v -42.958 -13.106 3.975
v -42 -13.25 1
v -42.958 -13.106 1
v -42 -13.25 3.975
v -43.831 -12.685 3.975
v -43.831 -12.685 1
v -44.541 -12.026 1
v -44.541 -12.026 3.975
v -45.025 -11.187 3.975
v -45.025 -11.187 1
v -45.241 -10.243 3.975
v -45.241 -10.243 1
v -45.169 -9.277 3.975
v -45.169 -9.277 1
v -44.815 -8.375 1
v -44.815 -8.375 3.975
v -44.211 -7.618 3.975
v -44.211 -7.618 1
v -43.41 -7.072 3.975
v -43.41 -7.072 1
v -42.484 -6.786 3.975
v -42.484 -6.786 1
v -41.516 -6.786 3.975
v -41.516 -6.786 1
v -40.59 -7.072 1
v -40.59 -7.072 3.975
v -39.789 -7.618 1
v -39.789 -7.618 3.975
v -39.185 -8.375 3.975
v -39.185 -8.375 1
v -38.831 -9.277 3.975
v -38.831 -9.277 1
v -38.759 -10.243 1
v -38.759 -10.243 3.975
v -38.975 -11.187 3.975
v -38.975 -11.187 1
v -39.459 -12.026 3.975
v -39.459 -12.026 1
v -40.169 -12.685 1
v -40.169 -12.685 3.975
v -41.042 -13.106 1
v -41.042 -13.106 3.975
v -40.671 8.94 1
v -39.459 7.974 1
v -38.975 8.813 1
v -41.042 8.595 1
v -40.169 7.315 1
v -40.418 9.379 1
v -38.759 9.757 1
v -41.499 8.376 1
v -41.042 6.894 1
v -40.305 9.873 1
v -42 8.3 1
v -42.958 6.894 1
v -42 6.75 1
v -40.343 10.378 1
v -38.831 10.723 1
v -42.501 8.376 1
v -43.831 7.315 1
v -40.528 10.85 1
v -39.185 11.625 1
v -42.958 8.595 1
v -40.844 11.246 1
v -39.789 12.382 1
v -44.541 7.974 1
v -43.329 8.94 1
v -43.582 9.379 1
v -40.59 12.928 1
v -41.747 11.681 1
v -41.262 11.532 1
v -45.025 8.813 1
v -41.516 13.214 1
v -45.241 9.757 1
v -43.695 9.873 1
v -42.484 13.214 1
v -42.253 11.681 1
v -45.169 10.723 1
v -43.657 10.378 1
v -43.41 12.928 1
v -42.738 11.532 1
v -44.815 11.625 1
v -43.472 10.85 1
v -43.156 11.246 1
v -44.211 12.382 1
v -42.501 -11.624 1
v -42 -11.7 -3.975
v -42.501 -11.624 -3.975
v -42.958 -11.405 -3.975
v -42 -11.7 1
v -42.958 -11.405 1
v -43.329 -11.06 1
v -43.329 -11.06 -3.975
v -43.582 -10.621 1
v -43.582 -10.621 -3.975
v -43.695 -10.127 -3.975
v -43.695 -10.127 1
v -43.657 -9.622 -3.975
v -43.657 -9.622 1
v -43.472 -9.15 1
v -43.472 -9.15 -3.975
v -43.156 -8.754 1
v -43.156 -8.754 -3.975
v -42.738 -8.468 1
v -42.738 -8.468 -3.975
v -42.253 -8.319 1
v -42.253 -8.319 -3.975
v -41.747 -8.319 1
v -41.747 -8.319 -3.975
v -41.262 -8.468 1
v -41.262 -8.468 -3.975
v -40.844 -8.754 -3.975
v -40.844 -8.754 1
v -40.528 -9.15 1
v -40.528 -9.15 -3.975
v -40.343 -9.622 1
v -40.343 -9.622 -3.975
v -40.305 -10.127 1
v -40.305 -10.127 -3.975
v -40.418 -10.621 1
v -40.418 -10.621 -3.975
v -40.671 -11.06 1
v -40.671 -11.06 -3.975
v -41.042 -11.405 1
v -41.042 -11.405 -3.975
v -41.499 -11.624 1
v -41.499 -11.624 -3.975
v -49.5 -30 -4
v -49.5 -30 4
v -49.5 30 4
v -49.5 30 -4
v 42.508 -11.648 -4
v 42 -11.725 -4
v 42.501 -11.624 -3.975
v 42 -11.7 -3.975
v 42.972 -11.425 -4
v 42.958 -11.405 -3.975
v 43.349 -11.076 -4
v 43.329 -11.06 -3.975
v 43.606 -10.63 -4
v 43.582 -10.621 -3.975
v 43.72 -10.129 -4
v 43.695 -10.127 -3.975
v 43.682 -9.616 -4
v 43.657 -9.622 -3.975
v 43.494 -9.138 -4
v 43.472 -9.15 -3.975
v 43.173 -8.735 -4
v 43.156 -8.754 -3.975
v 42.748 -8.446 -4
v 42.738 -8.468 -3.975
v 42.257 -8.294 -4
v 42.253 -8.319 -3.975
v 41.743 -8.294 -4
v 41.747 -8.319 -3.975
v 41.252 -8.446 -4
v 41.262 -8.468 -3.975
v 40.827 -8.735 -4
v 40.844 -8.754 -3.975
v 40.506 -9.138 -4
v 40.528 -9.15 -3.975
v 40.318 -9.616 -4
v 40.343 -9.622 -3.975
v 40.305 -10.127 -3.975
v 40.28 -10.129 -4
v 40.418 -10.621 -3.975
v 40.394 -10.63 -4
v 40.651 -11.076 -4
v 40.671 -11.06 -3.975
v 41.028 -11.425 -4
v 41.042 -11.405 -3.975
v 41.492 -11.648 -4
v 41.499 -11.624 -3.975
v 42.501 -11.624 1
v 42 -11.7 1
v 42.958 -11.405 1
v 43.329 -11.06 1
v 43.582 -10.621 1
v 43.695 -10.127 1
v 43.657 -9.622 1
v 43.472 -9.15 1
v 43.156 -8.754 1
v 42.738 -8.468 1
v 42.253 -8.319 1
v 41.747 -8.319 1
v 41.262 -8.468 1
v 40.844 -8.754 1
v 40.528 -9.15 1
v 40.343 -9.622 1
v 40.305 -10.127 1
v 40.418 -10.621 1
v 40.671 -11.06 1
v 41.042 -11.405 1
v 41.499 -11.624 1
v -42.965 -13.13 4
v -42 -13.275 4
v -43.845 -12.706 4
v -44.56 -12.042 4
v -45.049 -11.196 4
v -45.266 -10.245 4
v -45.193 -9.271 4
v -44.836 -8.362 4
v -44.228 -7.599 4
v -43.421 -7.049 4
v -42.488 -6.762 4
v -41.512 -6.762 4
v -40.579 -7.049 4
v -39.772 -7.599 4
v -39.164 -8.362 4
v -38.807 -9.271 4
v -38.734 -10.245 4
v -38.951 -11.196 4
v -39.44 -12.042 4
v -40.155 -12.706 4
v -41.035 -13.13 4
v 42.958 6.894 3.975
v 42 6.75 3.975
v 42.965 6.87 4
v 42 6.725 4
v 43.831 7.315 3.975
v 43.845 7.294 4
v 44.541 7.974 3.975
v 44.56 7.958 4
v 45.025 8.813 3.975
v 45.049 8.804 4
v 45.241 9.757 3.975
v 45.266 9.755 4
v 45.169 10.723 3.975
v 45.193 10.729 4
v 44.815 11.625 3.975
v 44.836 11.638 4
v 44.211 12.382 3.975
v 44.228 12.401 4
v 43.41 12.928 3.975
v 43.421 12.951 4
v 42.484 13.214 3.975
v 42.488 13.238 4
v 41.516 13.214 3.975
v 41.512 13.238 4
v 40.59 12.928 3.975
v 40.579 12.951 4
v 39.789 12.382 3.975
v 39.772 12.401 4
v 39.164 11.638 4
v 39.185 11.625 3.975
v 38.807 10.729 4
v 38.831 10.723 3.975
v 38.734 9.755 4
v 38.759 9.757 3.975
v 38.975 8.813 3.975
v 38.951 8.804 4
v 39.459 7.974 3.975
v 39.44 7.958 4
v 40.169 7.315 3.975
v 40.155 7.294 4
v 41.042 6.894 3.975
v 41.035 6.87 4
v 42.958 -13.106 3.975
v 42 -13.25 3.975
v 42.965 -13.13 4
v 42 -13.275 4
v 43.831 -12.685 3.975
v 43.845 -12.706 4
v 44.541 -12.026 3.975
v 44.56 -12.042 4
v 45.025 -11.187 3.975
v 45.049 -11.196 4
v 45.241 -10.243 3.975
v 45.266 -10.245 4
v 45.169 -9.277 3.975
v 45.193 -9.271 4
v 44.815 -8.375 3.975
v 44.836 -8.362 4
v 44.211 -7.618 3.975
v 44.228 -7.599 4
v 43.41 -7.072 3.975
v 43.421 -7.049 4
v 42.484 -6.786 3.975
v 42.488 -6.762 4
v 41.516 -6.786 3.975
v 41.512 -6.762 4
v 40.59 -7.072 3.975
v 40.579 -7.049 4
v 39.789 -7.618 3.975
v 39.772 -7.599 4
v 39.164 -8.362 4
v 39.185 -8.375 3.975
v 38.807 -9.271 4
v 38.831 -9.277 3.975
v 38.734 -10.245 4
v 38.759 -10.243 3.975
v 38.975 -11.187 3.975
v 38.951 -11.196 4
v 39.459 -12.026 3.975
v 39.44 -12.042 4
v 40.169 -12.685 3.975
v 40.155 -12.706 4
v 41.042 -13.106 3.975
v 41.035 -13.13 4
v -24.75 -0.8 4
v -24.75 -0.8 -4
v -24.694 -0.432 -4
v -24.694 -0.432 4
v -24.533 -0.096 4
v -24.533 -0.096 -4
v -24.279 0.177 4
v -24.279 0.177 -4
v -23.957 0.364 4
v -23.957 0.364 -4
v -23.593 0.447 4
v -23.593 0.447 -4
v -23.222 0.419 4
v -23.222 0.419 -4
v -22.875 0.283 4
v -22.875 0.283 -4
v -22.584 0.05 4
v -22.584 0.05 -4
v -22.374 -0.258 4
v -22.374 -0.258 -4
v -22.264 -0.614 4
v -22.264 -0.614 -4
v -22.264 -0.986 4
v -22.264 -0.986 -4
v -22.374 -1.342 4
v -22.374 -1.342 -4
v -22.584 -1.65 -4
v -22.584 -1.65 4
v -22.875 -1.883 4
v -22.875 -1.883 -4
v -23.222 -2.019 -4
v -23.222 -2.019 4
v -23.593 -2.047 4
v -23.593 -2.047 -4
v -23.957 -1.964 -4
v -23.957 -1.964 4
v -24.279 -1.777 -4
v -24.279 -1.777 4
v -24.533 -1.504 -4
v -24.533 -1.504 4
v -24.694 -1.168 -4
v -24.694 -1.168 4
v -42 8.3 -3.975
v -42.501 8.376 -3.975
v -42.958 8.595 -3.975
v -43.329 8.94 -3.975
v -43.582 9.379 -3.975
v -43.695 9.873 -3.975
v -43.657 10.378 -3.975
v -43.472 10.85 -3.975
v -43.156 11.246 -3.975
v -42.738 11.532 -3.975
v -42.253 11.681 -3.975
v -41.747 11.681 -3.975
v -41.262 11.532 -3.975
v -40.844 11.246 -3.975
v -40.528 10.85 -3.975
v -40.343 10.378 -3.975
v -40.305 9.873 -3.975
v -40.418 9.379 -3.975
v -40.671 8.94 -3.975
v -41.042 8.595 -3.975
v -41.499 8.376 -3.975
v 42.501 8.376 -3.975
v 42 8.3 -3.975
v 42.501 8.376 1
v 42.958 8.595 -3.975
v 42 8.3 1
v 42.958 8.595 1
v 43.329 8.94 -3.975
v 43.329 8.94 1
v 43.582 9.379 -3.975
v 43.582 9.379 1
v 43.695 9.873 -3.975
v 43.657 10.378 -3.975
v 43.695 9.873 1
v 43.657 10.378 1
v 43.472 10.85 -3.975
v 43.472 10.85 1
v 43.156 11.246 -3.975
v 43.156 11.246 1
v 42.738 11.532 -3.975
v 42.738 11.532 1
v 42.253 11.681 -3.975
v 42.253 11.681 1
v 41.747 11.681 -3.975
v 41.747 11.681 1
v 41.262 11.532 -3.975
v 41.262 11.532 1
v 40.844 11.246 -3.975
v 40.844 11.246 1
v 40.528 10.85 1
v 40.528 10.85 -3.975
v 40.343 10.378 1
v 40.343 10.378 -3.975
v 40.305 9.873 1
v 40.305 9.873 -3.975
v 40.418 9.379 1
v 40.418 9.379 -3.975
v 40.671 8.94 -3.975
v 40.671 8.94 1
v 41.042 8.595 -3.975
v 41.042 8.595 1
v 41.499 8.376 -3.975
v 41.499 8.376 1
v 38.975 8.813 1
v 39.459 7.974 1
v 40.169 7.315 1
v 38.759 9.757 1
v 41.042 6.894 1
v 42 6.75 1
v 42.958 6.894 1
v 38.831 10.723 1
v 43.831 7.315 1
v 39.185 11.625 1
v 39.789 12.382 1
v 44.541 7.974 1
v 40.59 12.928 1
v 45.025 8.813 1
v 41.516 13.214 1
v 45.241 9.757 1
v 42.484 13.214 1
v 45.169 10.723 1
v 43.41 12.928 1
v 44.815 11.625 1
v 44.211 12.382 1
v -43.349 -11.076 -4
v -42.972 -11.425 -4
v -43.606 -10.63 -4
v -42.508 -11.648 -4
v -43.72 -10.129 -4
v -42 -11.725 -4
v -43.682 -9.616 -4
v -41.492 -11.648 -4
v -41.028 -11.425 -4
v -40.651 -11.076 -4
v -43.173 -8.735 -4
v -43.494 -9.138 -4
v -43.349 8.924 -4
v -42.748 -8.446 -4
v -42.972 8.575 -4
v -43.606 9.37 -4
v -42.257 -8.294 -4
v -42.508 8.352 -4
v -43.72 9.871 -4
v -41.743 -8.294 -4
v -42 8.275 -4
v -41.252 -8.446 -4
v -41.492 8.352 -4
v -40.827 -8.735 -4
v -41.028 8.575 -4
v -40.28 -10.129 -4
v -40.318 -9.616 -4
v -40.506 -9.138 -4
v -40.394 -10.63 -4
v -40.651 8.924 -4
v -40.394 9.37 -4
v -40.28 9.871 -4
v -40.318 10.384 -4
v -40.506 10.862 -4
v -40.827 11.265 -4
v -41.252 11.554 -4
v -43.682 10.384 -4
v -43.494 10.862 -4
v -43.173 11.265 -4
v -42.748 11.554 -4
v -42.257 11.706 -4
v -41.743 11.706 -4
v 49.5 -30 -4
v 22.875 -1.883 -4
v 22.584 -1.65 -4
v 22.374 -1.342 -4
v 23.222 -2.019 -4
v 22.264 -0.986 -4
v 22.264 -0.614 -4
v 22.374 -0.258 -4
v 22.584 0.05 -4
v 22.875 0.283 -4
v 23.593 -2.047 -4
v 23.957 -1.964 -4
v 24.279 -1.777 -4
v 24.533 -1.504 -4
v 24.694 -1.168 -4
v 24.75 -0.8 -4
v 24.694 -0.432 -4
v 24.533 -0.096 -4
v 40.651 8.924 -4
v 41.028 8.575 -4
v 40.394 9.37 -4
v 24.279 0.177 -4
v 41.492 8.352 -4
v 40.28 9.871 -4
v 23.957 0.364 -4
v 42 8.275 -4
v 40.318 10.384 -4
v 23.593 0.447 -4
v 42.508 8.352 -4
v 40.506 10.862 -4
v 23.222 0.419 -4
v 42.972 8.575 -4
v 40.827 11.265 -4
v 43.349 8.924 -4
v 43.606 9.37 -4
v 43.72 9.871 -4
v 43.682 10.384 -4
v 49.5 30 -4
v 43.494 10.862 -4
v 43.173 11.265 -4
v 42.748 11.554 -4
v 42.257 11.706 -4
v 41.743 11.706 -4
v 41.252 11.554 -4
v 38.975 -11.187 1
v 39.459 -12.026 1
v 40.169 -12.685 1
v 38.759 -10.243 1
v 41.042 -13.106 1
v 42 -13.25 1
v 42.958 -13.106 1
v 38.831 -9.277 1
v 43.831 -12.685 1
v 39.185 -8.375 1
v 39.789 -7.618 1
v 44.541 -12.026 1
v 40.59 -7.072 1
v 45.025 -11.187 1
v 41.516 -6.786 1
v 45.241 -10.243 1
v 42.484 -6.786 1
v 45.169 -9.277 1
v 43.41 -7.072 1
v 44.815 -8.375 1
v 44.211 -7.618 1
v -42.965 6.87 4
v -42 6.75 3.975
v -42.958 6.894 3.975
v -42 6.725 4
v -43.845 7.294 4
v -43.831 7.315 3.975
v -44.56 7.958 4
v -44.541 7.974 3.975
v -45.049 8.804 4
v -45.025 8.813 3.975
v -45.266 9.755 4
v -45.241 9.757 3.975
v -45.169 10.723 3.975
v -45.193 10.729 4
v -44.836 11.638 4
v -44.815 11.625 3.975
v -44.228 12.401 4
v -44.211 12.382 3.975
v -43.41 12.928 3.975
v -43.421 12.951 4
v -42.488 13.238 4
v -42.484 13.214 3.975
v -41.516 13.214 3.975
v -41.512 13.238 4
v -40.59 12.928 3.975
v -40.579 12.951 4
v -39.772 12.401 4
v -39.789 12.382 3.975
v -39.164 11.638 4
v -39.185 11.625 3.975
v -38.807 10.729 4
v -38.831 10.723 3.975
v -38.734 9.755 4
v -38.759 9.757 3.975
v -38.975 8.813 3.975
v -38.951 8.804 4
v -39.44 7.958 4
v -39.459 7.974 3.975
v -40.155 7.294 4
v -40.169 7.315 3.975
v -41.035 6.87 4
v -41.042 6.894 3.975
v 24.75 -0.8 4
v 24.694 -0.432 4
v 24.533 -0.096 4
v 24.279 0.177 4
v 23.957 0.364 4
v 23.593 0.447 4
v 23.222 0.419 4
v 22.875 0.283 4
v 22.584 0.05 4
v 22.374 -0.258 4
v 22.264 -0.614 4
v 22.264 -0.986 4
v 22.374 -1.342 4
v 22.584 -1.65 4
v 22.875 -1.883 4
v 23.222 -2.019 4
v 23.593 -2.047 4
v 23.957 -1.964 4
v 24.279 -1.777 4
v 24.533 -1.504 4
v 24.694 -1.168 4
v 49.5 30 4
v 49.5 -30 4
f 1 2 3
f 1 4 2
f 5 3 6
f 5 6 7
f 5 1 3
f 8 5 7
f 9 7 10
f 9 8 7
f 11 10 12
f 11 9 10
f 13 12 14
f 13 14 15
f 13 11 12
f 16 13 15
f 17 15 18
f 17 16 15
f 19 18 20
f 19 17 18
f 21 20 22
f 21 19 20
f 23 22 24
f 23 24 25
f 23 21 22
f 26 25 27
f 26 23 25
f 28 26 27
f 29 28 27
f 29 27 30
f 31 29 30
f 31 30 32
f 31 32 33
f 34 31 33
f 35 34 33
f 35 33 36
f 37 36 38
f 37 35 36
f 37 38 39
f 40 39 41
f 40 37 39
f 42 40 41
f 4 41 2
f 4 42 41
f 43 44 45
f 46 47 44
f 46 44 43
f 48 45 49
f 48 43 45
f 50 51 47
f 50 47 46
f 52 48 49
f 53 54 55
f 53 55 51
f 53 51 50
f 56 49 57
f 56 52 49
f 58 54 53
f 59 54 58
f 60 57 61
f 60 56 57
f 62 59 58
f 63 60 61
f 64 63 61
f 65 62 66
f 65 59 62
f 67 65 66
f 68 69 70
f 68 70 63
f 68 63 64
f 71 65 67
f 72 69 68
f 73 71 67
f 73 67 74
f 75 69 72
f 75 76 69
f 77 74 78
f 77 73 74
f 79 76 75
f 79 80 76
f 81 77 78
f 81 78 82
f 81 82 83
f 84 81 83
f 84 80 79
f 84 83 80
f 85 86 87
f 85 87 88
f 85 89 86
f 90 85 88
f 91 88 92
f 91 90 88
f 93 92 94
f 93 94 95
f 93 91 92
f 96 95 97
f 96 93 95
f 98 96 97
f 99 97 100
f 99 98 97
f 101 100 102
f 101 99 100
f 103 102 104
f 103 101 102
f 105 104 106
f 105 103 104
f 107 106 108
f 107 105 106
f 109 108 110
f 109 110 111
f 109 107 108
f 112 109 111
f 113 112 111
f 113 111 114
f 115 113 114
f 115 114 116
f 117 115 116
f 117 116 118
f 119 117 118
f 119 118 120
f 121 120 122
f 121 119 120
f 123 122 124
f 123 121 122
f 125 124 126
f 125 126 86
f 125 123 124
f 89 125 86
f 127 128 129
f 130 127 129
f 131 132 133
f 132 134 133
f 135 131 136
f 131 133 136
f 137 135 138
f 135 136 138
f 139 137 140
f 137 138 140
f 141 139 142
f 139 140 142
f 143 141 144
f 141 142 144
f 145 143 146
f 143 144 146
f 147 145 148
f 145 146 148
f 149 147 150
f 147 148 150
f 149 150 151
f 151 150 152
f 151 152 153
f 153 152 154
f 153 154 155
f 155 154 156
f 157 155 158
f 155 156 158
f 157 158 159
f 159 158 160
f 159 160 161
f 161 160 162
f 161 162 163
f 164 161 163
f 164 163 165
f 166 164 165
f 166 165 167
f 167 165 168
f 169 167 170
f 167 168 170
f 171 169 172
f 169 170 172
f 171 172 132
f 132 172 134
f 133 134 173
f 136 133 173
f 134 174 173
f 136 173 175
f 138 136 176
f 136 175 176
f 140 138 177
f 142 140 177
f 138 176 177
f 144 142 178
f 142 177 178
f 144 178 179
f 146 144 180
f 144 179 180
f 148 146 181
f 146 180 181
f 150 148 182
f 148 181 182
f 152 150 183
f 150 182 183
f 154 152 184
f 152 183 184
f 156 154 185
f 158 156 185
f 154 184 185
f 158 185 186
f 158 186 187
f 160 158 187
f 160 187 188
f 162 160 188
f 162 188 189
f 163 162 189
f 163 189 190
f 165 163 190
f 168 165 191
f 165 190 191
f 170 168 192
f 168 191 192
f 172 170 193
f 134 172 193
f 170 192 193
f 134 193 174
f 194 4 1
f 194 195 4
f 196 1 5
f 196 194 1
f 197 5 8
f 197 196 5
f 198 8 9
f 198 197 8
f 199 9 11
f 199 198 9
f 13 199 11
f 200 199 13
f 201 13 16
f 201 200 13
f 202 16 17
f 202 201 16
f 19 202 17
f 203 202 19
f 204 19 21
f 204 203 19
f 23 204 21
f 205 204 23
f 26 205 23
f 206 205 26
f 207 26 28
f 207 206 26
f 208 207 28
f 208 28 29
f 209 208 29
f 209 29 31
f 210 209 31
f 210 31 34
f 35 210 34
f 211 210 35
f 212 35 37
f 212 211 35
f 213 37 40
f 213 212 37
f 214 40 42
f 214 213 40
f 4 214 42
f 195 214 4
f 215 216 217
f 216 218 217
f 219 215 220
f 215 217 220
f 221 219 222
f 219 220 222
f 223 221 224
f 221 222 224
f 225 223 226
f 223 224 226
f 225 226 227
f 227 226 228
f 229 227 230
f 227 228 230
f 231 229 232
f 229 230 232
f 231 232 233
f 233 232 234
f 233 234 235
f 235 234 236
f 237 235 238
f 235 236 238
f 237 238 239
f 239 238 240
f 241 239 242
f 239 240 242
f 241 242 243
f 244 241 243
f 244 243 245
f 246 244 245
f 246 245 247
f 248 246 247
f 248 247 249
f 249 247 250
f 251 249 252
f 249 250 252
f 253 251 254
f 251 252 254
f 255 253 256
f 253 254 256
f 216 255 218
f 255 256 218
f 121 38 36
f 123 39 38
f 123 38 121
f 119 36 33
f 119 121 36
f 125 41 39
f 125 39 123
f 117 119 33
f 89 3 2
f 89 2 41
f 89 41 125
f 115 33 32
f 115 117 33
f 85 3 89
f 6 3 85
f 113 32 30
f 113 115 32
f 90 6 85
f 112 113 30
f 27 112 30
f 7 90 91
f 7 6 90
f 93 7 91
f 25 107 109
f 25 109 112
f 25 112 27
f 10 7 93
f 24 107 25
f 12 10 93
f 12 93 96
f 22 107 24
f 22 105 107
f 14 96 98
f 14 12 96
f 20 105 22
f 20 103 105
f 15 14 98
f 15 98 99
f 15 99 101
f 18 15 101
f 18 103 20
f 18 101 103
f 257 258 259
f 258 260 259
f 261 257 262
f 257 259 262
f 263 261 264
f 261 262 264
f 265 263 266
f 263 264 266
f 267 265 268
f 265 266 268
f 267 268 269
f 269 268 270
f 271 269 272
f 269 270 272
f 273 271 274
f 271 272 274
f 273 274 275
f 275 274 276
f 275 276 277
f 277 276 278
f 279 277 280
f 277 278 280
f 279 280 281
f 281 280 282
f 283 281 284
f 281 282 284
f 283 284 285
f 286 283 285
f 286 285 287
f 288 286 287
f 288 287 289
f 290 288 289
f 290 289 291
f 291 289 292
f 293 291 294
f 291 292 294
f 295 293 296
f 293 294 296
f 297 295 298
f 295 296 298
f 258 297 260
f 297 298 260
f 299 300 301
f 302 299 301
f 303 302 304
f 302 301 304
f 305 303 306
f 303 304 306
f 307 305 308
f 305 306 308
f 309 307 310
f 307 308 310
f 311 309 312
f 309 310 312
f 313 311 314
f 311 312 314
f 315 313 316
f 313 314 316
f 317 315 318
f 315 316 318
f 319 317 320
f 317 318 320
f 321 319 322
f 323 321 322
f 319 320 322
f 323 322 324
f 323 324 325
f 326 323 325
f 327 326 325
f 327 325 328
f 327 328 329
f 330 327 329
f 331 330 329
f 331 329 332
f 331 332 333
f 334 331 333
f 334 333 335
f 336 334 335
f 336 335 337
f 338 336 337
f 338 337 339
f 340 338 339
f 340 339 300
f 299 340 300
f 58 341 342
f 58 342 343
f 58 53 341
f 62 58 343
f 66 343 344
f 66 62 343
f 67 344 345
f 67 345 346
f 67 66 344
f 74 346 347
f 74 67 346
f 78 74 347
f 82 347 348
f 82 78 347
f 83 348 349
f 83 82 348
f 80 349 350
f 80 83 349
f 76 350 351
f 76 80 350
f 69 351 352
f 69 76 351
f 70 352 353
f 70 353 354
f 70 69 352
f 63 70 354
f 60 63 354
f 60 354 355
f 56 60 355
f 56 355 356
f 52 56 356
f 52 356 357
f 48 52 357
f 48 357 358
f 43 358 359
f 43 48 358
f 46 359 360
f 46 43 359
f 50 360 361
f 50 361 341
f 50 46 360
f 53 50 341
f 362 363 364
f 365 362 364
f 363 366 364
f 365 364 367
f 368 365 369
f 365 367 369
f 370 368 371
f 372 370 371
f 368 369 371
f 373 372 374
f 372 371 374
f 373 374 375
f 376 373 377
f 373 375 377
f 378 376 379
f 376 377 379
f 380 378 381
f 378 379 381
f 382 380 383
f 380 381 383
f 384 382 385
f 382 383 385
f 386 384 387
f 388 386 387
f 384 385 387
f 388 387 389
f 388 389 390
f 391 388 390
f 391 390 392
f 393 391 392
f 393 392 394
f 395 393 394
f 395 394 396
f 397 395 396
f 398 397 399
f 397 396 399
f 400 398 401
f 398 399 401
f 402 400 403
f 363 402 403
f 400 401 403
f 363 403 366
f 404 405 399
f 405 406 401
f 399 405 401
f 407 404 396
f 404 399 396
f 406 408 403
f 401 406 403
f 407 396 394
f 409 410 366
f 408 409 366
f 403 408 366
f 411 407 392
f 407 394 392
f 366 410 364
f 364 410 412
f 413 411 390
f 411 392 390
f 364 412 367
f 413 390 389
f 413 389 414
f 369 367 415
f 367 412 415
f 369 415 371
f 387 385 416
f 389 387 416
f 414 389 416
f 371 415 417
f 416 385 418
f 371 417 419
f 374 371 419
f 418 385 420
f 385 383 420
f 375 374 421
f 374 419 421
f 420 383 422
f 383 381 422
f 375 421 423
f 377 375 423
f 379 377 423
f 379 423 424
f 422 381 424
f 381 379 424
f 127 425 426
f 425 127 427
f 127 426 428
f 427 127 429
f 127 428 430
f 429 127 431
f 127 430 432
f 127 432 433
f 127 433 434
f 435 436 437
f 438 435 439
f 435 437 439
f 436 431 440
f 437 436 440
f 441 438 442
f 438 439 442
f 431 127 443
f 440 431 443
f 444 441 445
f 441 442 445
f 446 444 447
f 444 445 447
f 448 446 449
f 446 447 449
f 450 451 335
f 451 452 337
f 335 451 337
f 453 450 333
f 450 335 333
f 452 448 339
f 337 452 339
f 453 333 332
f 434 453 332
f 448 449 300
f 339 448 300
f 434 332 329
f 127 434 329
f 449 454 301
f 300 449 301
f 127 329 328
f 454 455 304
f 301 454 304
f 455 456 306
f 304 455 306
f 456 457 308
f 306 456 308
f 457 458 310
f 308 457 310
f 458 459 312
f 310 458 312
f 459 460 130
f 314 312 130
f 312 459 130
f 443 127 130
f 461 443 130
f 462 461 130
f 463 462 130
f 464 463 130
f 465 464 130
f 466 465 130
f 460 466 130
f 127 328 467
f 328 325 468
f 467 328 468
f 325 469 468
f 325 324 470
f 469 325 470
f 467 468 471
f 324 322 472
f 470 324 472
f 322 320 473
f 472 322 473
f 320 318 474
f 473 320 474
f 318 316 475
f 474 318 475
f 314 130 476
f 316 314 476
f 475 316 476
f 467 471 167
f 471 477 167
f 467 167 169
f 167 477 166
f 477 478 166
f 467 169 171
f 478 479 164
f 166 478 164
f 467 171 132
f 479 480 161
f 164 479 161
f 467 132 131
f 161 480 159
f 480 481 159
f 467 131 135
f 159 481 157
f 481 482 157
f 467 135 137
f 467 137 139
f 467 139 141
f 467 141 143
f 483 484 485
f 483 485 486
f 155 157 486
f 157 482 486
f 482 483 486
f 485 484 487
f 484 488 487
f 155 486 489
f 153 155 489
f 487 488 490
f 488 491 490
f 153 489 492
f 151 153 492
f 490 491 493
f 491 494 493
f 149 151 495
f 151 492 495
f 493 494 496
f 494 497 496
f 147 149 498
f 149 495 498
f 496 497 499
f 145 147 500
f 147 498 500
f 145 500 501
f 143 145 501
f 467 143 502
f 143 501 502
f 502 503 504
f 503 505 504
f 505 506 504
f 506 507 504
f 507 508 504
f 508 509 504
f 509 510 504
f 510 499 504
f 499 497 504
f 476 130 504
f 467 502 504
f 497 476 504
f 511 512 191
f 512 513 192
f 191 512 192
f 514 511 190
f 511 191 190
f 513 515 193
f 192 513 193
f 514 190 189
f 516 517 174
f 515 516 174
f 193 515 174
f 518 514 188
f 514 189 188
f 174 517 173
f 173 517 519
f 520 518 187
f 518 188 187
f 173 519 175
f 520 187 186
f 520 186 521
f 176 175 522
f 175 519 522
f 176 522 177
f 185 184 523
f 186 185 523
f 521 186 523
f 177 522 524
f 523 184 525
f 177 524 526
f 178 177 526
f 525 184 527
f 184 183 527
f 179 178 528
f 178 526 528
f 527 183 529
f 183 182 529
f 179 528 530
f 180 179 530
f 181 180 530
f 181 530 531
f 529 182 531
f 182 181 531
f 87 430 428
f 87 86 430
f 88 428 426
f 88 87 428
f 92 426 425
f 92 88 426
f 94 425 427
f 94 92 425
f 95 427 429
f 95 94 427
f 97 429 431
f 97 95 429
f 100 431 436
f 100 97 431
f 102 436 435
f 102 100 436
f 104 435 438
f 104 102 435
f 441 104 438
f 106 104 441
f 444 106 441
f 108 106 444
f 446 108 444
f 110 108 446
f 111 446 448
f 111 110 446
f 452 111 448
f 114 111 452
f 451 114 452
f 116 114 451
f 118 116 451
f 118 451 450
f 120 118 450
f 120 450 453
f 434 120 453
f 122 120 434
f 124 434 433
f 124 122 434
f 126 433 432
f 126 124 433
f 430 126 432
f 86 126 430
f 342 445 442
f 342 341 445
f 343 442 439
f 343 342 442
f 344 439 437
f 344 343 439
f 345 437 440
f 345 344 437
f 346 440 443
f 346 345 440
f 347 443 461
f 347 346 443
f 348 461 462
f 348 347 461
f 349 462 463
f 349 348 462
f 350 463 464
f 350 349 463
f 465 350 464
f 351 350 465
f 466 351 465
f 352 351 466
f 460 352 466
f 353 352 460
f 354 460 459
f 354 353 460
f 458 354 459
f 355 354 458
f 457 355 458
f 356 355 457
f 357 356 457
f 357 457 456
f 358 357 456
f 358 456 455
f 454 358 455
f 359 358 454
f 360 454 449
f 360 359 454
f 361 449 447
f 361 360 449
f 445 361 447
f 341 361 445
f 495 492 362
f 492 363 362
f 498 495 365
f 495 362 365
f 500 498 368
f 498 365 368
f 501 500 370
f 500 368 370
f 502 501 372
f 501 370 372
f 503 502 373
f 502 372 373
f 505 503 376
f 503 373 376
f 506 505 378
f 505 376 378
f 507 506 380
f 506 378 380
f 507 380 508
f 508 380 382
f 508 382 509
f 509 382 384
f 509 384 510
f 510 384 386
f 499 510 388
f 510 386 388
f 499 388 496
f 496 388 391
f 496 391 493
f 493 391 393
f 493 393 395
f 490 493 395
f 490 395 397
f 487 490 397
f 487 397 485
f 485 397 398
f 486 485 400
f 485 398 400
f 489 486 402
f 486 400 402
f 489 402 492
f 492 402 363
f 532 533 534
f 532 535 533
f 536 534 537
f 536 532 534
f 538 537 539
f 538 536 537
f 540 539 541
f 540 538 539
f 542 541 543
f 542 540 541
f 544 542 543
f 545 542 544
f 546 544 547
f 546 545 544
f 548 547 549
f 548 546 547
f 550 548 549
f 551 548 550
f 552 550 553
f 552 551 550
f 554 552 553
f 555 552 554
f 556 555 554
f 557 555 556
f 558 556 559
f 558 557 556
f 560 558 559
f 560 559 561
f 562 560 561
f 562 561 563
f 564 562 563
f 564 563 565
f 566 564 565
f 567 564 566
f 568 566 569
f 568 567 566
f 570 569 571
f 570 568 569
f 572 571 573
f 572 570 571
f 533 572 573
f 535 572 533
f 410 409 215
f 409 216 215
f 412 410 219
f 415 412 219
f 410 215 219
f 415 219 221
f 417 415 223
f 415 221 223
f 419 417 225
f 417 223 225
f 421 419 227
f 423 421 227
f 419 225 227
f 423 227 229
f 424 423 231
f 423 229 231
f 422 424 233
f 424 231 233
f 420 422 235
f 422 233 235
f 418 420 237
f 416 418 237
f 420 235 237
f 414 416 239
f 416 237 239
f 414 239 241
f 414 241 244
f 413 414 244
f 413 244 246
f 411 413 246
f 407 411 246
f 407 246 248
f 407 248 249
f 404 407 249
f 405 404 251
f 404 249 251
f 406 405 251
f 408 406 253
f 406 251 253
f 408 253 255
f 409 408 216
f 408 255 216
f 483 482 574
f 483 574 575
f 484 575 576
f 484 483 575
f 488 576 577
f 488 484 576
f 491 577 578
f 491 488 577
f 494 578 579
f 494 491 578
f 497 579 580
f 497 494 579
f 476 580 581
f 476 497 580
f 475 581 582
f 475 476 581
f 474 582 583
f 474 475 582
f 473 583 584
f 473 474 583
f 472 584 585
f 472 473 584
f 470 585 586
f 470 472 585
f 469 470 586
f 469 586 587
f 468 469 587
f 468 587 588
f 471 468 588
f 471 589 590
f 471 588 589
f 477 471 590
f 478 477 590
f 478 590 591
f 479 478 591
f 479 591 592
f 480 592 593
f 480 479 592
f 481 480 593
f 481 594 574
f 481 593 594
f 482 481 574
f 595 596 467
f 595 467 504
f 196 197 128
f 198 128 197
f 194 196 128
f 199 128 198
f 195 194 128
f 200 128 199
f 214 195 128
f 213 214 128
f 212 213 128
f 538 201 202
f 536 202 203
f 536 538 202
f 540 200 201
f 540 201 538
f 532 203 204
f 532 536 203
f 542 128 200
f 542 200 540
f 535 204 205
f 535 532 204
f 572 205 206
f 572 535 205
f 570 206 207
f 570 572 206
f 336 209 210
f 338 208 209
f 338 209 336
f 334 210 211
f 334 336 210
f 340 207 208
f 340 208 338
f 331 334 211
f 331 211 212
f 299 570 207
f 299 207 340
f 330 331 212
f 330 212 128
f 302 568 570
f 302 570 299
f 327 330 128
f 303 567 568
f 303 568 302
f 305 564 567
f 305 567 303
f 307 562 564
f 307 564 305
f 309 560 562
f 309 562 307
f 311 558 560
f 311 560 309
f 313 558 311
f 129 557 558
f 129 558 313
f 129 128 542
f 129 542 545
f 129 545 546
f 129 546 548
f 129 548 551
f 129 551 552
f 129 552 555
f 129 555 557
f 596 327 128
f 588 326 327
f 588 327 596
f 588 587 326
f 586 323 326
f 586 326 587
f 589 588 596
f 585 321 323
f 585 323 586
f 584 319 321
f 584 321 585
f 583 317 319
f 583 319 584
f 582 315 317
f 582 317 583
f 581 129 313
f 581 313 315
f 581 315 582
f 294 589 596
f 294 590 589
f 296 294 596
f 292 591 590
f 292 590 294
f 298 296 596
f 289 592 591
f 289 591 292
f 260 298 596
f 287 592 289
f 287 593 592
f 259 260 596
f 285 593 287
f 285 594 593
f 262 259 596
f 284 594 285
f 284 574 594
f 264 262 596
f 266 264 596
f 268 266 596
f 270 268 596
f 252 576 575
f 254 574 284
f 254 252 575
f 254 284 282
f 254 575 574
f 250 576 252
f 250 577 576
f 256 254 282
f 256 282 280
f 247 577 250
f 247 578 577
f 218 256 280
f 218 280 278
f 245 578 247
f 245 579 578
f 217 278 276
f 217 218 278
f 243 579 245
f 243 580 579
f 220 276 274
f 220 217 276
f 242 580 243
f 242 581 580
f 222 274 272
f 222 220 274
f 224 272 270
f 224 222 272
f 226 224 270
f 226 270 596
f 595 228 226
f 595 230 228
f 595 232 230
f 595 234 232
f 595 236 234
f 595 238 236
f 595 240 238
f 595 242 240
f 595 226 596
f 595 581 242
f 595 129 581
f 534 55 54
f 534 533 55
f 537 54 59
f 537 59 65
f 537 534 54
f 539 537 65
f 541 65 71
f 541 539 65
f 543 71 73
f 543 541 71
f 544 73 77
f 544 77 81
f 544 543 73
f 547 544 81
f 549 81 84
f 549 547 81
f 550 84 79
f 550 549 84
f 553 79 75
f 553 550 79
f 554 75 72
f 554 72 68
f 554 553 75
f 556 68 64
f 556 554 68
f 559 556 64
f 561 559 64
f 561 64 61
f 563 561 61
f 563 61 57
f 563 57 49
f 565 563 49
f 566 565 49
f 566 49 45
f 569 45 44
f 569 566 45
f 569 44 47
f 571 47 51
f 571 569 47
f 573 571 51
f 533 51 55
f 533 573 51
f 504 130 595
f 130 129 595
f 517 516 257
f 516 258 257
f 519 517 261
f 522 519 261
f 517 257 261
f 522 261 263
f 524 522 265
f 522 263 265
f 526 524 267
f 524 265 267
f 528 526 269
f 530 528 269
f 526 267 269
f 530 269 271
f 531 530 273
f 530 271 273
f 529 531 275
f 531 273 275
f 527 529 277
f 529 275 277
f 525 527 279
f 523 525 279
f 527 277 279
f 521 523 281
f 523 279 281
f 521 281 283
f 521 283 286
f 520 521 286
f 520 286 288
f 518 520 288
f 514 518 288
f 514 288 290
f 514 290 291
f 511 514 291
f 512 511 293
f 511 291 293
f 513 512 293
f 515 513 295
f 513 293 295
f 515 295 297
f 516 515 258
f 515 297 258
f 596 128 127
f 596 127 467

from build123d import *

# Parameters (mm, degrees)
SKETCH1_W                     = 99
SKETCH1_H                     = 60
BOSS_EXTRUDE1_DEPTH           = 4
CBORE_FOR_M3_SHCS1_AT_2_COUNT = 2
CBORE_FOR_M3_SHCS1_AT_2_PITCH = 20
M3X0_5_TAPPED_HOLE1_D         = 2.5


with BuildPart() as part:
    # Sketch1 → Boss-Extrude1 (new body, symmetric)
    with BuildSketch(Plane.XY):
        Rectangle(SKETCH1_W, SKETCH1_H)
    extrude(amount=BOSS_EXTRUDE1_DEPTH, both=True)

    # Sketch3 → CBORE for M3 SHCS1 (revolve, cut)
    with BuildSketch(Plane(origin=(-42, 10, 4), x_dir=(0, -1, 0), z_dir=(1, 0, 0))):
        Polygon((0, 0), (0, 8), (1.725, 8), (1.7, 7.975), (1.7, 3), (3.25, 3), (3.25, 0.025), (3.275, 0), align=None)
    cbore_for_m3_shcs1 = revolve(axis=Axis((-42, 10, 10.35), (0, 0, -1)), mode=Mode.SUBTRACT)

    # CBORE for M3 SHCS1 at 2: CBORE for M3 SHCS1 ×2
    with Locations(*[(0, -i * CBORE_FOR_M3_SHCS1_AT_2_PITCH, 0) for i in range(1, CBORE_FOR_M3_SHCS1_AT_2_COUNT)]):
        add(cbore_for_m3_shcs1, mode=Mode.SUBTRACT)

    # M3x0.5 Tapped Hole1 (through all)
    with Locations(Plane.XY.offset(4)):
        with Locations((-23.5, -0.8)):
            m3x0_5_tapped_hole1 = Hole(M3X0_5_TAPPED_HOLE1_D / 2)

    # Mirror1: M3x0.5 Tapped Hole1, CBORE for M3 SHCS1 across plane
    add(m3x0_5_tapped_hole1.mirror(Plane(origin=(0, 0, 0), x_dir=(0, 0, 1), z_dir=(1, 0, 0))), mode=Mode.SUBTRACT)
    add(cbore_for_m3_shcs1.mirror(Plane(origin=(0, 0, 0), x_dir=(0, 0, 1), z_dir=(1, 0, 0))), mode=Mode.SUBTRACT)

    # Mirror1 copy 1 sketch → Mirror1 copy 1 (revolve, cut)
    with BuildSketch(Plane(origin=(42, -10, 4), x_dir=(0, -1, 0), z_dir=(-1, 0, 0))):
        Polygon((0, 0), (0, -8), (1.725, -8), (1.7, -7.975), (1.7, -3), (3.25, -3), (3.25, -0.025), (3.275, 0), align=None)
    revolve(axis=Axis((42, -10, 10.35), (0, 0, 1)), mode=Mode.SUBTRACT)


solid = part.part
